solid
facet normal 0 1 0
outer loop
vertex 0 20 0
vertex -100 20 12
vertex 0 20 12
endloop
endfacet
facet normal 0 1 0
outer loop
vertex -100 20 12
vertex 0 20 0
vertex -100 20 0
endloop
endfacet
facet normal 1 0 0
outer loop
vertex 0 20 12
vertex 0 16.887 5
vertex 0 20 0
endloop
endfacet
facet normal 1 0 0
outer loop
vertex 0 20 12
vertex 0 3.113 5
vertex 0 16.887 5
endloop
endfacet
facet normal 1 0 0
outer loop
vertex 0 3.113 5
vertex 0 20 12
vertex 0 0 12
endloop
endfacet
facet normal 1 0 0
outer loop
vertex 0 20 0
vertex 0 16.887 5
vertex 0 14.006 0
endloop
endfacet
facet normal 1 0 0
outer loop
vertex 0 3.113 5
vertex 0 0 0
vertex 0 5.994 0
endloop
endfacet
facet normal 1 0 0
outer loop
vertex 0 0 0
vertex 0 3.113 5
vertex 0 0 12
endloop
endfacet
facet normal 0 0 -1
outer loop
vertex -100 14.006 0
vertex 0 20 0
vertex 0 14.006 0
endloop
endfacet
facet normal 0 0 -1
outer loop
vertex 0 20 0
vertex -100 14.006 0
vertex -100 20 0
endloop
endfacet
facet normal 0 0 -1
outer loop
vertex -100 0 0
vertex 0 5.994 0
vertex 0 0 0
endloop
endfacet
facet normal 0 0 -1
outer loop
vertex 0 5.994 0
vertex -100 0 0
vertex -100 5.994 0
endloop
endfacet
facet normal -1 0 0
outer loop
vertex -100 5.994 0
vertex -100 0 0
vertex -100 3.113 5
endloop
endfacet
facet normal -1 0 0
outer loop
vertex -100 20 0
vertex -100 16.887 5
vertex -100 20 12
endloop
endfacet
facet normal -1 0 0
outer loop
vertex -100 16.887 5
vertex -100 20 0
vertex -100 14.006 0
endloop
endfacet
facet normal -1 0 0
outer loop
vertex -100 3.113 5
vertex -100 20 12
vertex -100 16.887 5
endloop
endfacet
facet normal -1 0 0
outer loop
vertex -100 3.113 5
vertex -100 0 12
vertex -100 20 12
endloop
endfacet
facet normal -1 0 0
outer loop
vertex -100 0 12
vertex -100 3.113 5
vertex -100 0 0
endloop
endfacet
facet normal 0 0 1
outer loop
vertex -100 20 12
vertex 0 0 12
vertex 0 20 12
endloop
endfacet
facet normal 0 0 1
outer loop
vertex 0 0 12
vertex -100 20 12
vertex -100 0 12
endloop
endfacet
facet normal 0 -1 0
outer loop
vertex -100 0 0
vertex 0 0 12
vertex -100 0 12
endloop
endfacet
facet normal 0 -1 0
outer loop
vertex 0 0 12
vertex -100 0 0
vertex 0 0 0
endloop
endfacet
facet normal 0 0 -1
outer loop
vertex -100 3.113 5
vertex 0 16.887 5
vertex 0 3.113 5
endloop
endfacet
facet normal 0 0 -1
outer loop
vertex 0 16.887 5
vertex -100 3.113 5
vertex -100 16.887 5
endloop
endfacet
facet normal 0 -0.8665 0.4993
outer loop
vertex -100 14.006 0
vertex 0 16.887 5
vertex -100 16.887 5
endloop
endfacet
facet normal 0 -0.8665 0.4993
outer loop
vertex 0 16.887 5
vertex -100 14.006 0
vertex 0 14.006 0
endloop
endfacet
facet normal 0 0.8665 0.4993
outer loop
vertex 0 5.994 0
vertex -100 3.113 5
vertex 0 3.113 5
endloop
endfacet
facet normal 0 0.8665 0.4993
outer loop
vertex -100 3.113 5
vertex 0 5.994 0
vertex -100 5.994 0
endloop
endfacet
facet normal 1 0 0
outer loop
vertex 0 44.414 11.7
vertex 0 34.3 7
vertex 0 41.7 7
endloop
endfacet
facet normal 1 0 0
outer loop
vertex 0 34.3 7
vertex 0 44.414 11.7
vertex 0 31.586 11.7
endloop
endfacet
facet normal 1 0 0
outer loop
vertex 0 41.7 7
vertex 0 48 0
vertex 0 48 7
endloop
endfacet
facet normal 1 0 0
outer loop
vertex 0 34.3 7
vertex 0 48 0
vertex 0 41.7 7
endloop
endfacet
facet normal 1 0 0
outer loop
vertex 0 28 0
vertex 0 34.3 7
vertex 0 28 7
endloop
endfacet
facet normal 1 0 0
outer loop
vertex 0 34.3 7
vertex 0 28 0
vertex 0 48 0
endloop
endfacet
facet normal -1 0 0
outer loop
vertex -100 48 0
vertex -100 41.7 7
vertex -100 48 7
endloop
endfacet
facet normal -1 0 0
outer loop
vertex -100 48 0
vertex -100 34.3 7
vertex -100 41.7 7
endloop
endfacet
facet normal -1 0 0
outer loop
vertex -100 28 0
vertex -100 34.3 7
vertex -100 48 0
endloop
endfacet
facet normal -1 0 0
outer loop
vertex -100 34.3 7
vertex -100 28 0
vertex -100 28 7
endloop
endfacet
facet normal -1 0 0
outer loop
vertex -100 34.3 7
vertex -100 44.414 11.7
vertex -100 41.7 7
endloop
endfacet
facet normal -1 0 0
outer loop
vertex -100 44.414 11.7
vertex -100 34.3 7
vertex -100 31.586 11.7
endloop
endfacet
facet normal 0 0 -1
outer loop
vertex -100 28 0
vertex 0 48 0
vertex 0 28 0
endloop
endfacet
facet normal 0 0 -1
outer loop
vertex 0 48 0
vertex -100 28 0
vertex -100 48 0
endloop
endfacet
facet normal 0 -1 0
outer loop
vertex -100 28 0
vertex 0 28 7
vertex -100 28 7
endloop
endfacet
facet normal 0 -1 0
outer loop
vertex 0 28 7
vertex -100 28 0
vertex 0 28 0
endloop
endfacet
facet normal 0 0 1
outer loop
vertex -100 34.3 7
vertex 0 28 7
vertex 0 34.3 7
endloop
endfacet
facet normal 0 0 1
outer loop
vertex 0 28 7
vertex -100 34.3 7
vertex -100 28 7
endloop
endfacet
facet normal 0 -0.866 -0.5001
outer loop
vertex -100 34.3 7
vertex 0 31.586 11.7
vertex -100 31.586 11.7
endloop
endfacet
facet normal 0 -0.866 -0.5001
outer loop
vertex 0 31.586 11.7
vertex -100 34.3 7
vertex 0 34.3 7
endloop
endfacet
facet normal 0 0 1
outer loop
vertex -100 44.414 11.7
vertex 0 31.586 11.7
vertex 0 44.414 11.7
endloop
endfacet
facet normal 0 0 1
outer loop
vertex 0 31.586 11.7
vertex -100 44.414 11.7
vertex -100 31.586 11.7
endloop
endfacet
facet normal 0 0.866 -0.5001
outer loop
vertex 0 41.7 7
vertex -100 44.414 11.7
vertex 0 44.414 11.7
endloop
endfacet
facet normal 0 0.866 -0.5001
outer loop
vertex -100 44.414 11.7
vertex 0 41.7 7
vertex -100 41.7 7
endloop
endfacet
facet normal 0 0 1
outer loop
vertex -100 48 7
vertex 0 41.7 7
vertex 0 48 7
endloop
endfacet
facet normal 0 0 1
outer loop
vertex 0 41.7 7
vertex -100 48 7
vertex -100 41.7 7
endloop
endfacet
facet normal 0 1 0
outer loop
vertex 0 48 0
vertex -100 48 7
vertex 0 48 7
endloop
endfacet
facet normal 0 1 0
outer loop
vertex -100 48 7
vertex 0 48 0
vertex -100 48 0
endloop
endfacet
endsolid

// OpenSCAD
// =============================================================
// drawer_rail.scad
// Modular dovetail drawer slide — no rollers required.
//
// Two pieces per side of the drawer:
//   rail_channel()  — "female" piece, mounts to cabinet wall
//   rail_tongue()   — "male" piece, mounts to drawer side wall
//
// How it works
// ─────────────
//   The tongue slides inside the channel along the X axis (rail length).
//   The dovetail shape locks them together vertically — can't fall out.
//   Lubricate with candle wax, PTFE spray, or soap for smooth sliding.
//
// Modular
// ───────
//   Print as many segments as needed to reach full drawer depth.
//   Butt segments end-to-end; alignment pins (optional) or just glue
//   at the joint. The dovetail profile is continuous across joints.
//
// To stop drawer from pulling fully out: print a small end cap
// (a strip that screws across the channel opening at the front end).
//
// Parameters
//   rw      rail width  (Y, mm)                [20]
//   rh      rail height (Z, mm)                [12]
//   seg_len segment length (X, mm)             [100]
//   dt_h    dovetail slot depth (mm)           [5]
//   dt_b    dovetail opening width (mm)        [8]
//   dt_ang  dovetail angle from vertical (°)   [30]
//   tol     sliding clearance per face (mm)    [0.3]
//   mt_d    mounting screw diameter (mm)       [3]
//
// Print orientation
//   Both pieces: flat side down (mounting face on build plate). No supports.
//   PETG recommended — better wear resistance and slight flex.
// =============================================================

$fa = 2; $fs = 0.4;

rw      = 20;
rh      = 12;
seg_len = 100;
dt_h    = 5;
dt_b    = 8;
dt_ang  = 30;
tol     = 0.3;
mt_d    = 3;

dt_exp  = dt_h * tan(dt_ang);   // horizontal flare per side at full depth


// ── helper: extrude 2D child along X axis ──────────────────────────
// In the 2D polygon, first coord = Z (height), second coord = Y (width).
module _extrude_x(len) {
    rotate([0, -90, 0])
    linear_extrude(len)
    children();
}


// ── CHANNEL ────────────────────────────────────────────────────────
// Mounting face: Z = rh (the top face — screw through it into cabinet wall).
// Groove opens at Z = 0 (bottom face, facing the drawer).
//
//   Cross-section (YZ, front view):
//
//   Z=rh ┌────────────────────┐  ← mount to wall here
//        │                    │
//   Z=dh ├───╲            ╱───┤  ← widest point of groove
//        │    ╲          ╱    │
//   Z=0  ├─────┤          ├───┤  ← groove opening (faces drawer)
//        (y0)              (y0+dt_b)

module rail_channel(len = seg_len) {
    y0 = (rw - dt_b) / 2;

    difference() {
        // Outer block
        _extrude_x(len)
        square([rh, rw]);

        // Dovetail groove: extend -0.01 below Z=0 for clean face
        _extrude_x(len)
        polygon([
            [-0.01, y0],
            [-0.01, y0 + dt_b],
            [dt_h,  y0 + dt_b + dt_exp],
            [dt_h,  y0 - dt_exp]
        ]);

        // Mounting screw holes through top (Z=rh) face
        for (x = [len * 0.25, len * 0.75])
            translate([x, rw / 2, rh * 0.5 - 0.01])
                cylinder(d = mt_d + 0.2, h = rh * 0.6, $fn = 16);
    }
}


// ── TONGUE ─────────────────────────────────────────────────────────
// Mounting face: Z = 0 (the bottom flat face — screw through it into drawer wall).
// Dovetail tongue protrudes upward from Z = base_h, slides into channel groove.
//
//   Cross-section (YZ, front view):
//
//        /──────────────\    ← tongue (slightly smaller than groove, tol gap)
//       /                \
//   ───┘                  └──  ← shoulder at Z=base_h
//   ─────────────────────────  ← flat base, Z=0..base_h, mount here

module rail_tongue(len = seg_len) {
    b_t    = dt_b - 2 * tol;
    exp_t  = (dt_h - tol) * tan(dt_ang);
    y0_t   = (rw - b_t) / 2;
    base_h = rh - dt_h;

    difference() {
        _extrude_x(len)
        union() {
            // Flat mounting base
            square([base_h, rw]);
            // Dovetail tongue
            polygon([
                [base_h,             y0_t],
                [base_h,             y0_t + b_t],
                [base_h + dt_h - tol, y0_t + b_t + exp_t],
                [base_h + dt_h - tol, y0_t - exp_t]
            ]);
        }

        // Mounting screw holes through bottom (Z=0) face
        for (x = [len * 0.25, len * 0.75])
            translate([x, rw / 2, -0.01])
                cylinder(d = mt_d + 0.2, h = base_h + 0.02, $fn = 16);
    }
}


// ── DEMO ───────────────────────────────────────────────────────────
// Renders channel and tongue side by side, with tongue offset
// to show the cross-section profile clearly.

color("SteelBlue", 0.9)
rail_channel();

// Tongue: separated by 5mm gap for clarity
translate([0, rw + 8, 0])
color("Tomato", 0.9)
rail_tongue();
